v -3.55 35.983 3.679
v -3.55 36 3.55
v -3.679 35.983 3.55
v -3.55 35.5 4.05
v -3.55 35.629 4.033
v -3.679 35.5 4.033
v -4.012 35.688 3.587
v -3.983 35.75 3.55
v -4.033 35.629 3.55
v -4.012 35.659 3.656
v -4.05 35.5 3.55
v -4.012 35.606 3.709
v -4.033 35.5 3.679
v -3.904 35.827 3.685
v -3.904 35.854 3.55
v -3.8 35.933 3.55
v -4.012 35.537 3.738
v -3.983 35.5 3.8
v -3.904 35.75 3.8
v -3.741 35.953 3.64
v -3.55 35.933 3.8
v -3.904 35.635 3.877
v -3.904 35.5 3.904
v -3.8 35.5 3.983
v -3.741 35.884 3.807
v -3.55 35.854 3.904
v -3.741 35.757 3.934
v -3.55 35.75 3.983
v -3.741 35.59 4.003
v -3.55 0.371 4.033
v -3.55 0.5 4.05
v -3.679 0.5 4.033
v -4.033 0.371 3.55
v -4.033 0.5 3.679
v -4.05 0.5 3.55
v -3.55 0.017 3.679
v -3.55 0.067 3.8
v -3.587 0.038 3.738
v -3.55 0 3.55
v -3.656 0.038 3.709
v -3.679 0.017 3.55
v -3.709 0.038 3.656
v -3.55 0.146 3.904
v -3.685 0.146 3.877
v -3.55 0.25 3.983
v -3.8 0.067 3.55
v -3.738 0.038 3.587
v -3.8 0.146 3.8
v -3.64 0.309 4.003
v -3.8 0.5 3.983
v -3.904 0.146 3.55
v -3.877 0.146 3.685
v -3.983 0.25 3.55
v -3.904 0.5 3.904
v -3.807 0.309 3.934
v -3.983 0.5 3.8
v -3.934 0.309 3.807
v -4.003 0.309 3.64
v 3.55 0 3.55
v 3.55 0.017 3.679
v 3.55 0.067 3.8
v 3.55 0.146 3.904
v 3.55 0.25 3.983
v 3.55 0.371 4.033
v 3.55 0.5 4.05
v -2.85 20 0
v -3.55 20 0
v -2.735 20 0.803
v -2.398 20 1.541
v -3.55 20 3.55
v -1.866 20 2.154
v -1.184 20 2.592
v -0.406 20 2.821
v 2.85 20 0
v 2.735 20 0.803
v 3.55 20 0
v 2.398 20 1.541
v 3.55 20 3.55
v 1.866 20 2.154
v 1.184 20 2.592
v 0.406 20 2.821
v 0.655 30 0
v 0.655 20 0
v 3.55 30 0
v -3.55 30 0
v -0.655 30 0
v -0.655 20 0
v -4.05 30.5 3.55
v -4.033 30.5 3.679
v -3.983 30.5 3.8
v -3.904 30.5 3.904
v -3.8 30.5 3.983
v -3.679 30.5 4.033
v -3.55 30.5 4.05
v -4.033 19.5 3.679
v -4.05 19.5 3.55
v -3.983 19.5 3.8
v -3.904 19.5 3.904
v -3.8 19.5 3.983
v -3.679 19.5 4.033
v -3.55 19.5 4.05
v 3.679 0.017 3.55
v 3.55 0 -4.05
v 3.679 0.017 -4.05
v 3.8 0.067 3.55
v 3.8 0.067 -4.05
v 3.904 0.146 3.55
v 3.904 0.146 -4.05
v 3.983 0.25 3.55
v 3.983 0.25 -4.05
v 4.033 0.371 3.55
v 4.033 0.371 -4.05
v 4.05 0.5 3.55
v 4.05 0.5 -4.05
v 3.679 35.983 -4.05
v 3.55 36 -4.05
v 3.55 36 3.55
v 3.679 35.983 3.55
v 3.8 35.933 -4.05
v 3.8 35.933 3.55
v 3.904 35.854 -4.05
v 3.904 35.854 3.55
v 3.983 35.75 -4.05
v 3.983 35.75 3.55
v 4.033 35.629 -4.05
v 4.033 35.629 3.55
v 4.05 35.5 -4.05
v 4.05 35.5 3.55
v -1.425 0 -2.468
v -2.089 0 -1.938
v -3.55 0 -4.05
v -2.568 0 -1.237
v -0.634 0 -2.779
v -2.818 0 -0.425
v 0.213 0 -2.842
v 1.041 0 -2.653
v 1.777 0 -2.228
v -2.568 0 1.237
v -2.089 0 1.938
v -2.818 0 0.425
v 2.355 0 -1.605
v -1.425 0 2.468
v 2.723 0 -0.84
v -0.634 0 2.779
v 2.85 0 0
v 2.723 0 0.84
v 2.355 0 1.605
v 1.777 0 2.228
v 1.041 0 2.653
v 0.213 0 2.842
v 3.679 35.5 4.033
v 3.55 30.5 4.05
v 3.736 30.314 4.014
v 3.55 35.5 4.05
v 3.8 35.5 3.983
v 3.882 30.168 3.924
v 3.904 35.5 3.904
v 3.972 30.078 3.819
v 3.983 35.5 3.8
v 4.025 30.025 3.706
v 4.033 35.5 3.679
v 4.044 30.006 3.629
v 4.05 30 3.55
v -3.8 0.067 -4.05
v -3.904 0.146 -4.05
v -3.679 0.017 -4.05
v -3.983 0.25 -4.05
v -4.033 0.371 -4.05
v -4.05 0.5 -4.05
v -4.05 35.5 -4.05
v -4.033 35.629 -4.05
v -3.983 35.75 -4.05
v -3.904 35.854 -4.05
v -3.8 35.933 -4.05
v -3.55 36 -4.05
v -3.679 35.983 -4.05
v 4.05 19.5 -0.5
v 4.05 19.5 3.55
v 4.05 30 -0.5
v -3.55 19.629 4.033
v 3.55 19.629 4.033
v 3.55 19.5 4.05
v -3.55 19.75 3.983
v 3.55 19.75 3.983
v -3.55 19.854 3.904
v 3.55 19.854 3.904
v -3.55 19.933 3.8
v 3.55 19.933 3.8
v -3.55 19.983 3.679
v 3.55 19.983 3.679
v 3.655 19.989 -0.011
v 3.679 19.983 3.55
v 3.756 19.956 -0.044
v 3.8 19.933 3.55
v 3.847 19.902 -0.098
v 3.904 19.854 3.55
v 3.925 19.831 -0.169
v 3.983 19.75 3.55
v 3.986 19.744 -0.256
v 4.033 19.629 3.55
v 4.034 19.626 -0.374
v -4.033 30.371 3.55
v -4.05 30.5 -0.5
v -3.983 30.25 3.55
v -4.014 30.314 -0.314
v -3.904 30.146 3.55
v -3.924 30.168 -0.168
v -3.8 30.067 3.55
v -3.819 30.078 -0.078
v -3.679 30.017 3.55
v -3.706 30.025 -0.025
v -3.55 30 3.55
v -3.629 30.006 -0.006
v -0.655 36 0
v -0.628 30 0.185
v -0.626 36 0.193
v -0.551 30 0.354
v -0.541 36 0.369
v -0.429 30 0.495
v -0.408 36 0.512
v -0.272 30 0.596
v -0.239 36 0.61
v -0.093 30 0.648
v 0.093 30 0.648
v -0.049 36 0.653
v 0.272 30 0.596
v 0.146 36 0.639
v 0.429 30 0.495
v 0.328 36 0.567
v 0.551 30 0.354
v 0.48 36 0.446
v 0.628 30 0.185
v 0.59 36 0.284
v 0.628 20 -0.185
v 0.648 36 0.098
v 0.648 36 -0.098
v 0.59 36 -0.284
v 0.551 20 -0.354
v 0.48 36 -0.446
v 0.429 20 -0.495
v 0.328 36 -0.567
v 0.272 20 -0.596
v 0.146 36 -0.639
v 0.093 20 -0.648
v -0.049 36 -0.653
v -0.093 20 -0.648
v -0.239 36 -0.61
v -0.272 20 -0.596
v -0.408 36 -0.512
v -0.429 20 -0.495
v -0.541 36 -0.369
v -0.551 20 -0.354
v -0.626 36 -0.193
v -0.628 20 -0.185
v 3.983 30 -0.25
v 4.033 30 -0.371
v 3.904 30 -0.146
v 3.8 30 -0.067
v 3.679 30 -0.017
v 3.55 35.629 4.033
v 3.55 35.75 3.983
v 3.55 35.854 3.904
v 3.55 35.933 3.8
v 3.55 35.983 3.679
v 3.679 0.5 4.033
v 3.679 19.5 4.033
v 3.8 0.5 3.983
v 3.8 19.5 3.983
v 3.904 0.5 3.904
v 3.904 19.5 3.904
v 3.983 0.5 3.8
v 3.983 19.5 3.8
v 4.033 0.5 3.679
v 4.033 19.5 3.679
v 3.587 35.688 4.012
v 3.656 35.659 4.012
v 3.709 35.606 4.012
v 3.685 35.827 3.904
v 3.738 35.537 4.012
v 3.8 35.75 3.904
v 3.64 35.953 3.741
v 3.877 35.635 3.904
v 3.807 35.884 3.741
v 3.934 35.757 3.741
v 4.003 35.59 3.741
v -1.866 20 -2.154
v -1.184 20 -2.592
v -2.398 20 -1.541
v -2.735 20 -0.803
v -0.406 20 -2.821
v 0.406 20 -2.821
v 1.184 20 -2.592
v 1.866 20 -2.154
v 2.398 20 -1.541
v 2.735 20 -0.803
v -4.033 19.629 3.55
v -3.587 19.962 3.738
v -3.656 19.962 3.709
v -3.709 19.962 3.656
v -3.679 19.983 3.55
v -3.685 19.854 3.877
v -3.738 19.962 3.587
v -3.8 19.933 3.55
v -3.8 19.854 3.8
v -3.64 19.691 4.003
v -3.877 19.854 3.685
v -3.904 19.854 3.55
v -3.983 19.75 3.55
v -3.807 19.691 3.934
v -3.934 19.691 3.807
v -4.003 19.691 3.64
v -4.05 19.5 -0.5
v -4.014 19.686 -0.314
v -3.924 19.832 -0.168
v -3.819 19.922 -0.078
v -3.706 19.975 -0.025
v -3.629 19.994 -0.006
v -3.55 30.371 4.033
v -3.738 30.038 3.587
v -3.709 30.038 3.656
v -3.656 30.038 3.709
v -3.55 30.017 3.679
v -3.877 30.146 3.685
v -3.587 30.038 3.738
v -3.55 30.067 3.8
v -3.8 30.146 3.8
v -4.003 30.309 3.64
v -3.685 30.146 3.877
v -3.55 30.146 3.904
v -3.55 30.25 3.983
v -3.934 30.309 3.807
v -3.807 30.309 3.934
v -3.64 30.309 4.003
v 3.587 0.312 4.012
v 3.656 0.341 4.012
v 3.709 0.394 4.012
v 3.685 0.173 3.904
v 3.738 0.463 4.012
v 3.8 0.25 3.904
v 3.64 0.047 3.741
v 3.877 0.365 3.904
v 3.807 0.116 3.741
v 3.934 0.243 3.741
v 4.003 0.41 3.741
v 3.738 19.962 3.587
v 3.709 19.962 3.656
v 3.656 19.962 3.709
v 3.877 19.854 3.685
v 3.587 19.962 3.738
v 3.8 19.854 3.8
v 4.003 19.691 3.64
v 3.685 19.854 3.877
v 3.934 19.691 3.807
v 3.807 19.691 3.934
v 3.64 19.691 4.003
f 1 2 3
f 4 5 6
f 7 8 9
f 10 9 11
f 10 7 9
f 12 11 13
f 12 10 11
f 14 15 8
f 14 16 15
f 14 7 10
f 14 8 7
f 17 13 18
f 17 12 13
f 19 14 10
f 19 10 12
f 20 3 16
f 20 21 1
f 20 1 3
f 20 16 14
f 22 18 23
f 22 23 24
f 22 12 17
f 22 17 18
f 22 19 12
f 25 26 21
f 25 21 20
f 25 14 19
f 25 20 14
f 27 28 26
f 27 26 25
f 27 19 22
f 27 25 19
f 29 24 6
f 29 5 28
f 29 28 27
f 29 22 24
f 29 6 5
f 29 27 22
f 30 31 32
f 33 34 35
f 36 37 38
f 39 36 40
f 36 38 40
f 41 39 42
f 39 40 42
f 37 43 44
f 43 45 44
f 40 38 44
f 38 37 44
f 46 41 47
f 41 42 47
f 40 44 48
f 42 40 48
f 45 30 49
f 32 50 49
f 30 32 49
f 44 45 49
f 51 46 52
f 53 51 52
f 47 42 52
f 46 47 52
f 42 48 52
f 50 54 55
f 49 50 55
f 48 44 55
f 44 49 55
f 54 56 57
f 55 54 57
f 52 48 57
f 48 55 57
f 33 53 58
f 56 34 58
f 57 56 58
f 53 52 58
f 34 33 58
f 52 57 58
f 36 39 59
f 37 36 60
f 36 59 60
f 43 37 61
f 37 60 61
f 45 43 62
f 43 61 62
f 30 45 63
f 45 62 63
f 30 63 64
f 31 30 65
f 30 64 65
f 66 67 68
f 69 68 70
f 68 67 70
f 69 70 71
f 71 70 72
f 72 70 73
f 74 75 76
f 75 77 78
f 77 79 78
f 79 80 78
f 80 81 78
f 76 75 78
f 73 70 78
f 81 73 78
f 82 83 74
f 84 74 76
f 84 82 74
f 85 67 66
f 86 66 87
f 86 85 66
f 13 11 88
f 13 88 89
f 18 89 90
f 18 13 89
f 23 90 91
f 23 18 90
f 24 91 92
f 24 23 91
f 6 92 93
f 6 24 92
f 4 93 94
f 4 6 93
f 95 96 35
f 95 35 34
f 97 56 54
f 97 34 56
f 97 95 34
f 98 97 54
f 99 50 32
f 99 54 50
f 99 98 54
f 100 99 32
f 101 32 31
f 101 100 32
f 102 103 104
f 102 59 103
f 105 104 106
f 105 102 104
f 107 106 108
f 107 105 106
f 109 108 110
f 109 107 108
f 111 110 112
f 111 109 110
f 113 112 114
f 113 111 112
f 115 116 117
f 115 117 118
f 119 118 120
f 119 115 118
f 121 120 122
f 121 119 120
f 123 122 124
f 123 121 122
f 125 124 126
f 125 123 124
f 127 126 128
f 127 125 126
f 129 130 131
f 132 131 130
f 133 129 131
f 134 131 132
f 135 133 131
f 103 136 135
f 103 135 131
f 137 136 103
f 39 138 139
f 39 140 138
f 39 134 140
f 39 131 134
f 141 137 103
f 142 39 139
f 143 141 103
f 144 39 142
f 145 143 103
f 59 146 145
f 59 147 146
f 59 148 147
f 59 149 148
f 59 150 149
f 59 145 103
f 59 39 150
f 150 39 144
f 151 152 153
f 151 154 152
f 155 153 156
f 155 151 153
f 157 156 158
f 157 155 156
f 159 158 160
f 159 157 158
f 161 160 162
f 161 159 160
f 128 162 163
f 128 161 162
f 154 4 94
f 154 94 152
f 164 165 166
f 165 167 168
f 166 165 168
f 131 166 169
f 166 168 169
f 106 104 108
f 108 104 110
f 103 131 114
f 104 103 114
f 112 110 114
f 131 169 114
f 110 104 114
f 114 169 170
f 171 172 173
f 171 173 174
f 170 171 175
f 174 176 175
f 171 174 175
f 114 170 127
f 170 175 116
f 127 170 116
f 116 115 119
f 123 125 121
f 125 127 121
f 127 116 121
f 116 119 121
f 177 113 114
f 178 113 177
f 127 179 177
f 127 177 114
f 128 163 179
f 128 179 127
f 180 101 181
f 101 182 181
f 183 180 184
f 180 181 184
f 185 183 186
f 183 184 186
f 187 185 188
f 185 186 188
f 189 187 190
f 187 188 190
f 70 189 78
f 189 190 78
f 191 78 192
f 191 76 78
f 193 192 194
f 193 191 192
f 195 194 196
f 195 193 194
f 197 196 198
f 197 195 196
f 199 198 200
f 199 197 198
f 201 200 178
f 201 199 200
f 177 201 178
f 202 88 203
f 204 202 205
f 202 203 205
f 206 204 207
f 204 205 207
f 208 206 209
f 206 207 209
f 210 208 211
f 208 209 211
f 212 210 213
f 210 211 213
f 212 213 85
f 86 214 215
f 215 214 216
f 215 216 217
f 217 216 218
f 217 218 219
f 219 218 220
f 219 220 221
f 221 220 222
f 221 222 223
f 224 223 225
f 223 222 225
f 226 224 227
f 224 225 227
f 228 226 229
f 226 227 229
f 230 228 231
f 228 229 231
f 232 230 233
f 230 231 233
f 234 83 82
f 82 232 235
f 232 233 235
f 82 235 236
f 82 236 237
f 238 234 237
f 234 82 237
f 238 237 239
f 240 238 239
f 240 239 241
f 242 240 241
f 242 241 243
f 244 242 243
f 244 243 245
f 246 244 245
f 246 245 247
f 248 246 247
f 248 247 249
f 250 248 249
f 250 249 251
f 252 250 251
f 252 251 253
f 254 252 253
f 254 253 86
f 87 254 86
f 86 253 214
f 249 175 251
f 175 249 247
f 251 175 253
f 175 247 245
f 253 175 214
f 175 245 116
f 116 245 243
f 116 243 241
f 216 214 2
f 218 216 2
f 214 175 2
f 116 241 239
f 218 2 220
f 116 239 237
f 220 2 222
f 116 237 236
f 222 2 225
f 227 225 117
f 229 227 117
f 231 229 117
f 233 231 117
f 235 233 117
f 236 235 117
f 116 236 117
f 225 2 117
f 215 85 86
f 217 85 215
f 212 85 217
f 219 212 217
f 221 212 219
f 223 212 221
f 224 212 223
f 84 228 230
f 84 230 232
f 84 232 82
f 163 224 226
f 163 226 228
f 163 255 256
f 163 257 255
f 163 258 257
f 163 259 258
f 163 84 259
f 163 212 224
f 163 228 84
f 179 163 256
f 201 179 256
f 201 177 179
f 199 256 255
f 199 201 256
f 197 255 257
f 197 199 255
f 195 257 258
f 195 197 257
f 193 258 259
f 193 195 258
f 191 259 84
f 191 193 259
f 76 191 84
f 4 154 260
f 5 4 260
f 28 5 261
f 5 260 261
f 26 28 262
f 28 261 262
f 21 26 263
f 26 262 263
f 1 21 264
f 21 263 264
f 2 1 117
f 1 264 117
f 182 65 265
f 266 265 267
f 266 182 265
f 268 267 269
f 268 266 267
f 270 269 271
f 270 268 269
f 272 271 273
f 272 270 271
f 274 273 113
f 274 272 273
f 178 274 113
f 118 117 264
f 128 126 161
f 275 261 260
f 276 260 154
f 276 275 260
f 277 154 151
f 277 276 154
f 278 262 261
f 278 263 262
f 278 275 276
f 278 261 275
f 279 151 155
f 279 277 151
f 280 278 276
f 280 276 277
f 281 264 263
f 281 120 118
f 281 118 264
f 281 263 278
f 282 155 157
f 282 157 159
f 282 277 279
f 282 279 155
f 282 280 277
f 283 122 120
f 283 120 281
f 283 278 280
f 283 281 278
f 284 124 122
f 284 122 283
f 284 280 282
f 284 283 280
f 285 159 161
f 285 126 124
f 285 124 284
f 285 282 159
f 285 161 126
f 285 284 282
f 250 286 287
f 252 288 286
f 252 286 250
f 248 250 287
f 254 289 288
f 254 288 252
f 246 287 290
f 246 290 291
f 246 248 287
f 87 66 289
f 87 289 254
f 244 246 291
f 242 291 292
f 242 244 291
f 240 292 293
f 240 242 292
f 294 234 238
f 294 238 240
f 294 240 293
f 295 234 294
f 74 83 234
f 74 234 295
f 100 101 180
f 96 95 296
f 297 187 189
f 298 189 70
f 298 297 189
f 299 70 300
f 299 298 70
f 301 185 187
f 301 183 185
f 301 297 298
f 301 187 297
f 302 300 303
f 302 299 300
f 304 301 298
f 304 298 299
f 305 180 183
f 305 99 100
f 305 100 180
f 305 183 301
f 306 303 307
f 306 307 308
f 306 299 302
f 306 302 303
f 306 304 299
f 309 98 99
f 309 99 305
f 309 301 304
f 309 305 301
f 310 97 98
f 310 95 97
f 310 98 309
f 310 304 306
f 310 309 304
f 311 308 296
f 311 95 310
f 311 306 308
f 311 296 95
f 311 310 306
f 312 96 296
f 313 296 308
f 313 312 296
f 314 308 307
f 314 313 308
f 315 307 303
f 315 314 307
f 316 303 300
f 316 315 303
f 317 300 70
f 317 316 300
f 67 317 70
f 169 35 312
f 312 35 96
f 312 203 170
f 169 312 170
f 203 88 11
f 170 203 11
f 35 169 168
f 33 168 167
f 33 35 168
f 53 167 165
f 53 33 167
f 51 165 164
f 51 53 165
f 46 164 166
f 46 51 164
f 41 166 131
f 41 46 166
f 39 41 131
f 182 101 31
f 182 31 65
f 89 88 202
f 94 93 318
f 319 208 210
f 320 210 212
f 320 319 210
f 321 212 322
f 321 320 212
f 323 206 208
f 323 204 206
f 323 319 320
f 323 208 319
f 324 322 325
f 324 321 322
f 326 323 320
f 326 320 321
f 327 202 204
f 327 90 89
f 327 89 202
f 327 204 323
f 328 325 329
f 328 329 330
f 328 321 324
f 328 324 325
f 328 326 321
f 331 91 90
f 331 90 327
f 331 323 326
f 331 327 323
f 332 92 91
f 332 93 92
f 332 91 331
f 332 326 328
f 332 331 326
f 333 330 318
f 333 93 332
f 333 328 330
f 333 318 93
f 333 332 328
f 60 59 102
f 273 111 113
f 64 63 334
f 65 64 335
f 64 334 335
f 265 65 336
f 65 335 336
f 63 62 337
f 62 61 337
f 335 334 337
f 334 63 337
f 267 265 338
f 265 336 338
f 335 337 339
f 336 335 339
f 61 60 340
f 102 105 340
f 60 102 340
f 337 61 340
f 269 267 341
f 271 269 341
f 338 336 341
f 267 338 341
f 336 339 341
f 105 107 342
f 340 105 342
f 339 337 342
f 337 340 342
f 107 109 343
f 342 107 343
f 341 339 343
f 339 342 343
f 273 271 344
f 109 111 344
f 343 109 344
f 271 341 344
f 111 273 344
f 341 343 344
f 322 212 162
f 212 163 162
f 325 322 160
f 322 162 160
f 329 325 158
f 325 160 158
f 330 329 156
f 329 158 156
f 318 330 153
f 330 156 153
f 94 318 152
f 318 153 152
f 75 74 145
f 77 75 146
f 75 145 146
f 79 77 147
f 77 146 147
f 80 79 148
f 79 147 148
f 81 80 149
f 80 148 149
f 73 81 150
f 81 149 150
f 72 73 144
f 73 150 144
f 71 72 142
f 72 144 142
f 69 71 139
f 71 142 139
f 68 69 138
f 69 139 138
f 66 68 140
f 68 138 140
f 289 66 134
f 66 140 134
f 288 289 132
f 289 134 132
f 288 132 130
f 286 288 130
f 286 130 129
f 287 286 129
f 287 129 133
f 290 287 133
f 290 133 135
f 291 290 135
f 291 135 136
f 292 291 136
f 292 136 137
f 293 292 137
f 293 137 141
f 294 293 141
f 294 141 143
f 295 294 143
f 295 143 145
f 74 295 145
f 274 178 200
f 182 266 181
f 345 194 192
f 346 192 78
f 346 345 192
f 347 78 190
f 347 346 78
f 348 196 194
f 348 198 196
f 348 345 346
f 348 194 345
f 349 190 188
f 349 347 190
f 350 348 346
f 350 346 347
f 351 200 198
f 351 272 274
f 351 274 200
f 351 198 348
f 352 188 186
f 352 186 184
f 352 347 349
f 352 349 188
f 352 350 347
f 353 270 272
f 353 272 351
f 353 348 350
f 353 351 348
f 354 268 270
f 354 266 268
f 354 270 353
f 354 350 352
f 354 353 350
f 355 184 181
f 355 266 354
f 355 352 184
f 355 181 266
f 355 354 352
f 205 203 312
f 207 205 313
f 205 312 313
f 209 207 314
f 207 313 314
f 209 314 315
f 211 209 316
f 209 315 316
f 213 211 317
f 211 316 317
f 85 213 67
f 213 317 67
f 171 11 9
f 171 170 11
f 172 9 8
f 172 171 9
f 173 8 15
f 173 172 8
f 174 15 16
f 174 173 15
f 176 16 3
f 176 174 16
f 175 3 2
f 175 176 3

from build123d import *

# Parameters (mm, degrees)
SKETCH_W        = 8.1
SKETCH_H        = 36
PAD_DEPTH       = 4.05
SKETCH001_R     = 2.85
POCKET_DEPTH    = 20
SKETCH002_R     = 0.655
POCKET001_DEPTH = 16
SKETCH003_W     = 12.15
SKETCH003_H     = 10
POCKET002_DEPTH = 4.05
FILLET_R        = 0.5


with BuildPart() as part:
    # Sketch → Pad (new body, symmetric)
    with BuildSketch(Plane.XY):
        with Locations((0, 18)):
            Rectangle(SKETCH_W, SKETCH_H)
    extrude(amount=PAD_DEPTH, both=True)

    # Sketch001 → Pocket (cut)
    with BuildSketch(Plane.XZ):
        Circle(SKETCH001_R)
    extrude(amount=-POCKET_DEPTH, mode=Mode.SUBTRACT)

    # Sketch002 (on DatumPlane) → Pocket001 (cut)
    with BuildSketch(Plane(origin=(0, 36, 0), x_dir=(-1, 0, 0), z_dir=(0, 1, 0))):
        Circle(SKETCH002_R)
    extrude(amount=-POCKET001_DEPTH, mode=Mode.SUBTRACT)

    # Sketch003 (on DatumPlane) → Pocket002 (cut)
    with BuildSketch(Plane.XY.offset(4.05)):
        with Locations((0, 25)):
            Rectangle(SKETCH003_W, SKETCH003_H)
    extrude(amount=-POCKET002_DEPTH, mode=Mode.SUBTRACT)

    # Fillet
    fillet_edges = [part.edges().sort_by_distance(p)[0] for p in [
        (4.05, 36, 0),
        (0, 36, 4.05),
        (-4.05, 36, 0),
        (4.05, 33, 4.05),
        (-4.05, 33, 4.05),
        (-4.05, 10, 4.05),
        (4.05, 0, 0),
        (0, 0, 4.05),
        (-4.05, 0, 0),
        (4.05, 10, 4.05),
        (4.05, 20, 2.025),
        (4.05, 25, 0),
        (0, 20, 4.05),
        (-4.05, 20, 2.025),
        (-4.05, 25, 0),
        (-4.05, 30, 2.025),
        (0, 30, 4.05),
    ]]
    fillet(fillet_edges, radius=FILLET_R)


solid = part.part
